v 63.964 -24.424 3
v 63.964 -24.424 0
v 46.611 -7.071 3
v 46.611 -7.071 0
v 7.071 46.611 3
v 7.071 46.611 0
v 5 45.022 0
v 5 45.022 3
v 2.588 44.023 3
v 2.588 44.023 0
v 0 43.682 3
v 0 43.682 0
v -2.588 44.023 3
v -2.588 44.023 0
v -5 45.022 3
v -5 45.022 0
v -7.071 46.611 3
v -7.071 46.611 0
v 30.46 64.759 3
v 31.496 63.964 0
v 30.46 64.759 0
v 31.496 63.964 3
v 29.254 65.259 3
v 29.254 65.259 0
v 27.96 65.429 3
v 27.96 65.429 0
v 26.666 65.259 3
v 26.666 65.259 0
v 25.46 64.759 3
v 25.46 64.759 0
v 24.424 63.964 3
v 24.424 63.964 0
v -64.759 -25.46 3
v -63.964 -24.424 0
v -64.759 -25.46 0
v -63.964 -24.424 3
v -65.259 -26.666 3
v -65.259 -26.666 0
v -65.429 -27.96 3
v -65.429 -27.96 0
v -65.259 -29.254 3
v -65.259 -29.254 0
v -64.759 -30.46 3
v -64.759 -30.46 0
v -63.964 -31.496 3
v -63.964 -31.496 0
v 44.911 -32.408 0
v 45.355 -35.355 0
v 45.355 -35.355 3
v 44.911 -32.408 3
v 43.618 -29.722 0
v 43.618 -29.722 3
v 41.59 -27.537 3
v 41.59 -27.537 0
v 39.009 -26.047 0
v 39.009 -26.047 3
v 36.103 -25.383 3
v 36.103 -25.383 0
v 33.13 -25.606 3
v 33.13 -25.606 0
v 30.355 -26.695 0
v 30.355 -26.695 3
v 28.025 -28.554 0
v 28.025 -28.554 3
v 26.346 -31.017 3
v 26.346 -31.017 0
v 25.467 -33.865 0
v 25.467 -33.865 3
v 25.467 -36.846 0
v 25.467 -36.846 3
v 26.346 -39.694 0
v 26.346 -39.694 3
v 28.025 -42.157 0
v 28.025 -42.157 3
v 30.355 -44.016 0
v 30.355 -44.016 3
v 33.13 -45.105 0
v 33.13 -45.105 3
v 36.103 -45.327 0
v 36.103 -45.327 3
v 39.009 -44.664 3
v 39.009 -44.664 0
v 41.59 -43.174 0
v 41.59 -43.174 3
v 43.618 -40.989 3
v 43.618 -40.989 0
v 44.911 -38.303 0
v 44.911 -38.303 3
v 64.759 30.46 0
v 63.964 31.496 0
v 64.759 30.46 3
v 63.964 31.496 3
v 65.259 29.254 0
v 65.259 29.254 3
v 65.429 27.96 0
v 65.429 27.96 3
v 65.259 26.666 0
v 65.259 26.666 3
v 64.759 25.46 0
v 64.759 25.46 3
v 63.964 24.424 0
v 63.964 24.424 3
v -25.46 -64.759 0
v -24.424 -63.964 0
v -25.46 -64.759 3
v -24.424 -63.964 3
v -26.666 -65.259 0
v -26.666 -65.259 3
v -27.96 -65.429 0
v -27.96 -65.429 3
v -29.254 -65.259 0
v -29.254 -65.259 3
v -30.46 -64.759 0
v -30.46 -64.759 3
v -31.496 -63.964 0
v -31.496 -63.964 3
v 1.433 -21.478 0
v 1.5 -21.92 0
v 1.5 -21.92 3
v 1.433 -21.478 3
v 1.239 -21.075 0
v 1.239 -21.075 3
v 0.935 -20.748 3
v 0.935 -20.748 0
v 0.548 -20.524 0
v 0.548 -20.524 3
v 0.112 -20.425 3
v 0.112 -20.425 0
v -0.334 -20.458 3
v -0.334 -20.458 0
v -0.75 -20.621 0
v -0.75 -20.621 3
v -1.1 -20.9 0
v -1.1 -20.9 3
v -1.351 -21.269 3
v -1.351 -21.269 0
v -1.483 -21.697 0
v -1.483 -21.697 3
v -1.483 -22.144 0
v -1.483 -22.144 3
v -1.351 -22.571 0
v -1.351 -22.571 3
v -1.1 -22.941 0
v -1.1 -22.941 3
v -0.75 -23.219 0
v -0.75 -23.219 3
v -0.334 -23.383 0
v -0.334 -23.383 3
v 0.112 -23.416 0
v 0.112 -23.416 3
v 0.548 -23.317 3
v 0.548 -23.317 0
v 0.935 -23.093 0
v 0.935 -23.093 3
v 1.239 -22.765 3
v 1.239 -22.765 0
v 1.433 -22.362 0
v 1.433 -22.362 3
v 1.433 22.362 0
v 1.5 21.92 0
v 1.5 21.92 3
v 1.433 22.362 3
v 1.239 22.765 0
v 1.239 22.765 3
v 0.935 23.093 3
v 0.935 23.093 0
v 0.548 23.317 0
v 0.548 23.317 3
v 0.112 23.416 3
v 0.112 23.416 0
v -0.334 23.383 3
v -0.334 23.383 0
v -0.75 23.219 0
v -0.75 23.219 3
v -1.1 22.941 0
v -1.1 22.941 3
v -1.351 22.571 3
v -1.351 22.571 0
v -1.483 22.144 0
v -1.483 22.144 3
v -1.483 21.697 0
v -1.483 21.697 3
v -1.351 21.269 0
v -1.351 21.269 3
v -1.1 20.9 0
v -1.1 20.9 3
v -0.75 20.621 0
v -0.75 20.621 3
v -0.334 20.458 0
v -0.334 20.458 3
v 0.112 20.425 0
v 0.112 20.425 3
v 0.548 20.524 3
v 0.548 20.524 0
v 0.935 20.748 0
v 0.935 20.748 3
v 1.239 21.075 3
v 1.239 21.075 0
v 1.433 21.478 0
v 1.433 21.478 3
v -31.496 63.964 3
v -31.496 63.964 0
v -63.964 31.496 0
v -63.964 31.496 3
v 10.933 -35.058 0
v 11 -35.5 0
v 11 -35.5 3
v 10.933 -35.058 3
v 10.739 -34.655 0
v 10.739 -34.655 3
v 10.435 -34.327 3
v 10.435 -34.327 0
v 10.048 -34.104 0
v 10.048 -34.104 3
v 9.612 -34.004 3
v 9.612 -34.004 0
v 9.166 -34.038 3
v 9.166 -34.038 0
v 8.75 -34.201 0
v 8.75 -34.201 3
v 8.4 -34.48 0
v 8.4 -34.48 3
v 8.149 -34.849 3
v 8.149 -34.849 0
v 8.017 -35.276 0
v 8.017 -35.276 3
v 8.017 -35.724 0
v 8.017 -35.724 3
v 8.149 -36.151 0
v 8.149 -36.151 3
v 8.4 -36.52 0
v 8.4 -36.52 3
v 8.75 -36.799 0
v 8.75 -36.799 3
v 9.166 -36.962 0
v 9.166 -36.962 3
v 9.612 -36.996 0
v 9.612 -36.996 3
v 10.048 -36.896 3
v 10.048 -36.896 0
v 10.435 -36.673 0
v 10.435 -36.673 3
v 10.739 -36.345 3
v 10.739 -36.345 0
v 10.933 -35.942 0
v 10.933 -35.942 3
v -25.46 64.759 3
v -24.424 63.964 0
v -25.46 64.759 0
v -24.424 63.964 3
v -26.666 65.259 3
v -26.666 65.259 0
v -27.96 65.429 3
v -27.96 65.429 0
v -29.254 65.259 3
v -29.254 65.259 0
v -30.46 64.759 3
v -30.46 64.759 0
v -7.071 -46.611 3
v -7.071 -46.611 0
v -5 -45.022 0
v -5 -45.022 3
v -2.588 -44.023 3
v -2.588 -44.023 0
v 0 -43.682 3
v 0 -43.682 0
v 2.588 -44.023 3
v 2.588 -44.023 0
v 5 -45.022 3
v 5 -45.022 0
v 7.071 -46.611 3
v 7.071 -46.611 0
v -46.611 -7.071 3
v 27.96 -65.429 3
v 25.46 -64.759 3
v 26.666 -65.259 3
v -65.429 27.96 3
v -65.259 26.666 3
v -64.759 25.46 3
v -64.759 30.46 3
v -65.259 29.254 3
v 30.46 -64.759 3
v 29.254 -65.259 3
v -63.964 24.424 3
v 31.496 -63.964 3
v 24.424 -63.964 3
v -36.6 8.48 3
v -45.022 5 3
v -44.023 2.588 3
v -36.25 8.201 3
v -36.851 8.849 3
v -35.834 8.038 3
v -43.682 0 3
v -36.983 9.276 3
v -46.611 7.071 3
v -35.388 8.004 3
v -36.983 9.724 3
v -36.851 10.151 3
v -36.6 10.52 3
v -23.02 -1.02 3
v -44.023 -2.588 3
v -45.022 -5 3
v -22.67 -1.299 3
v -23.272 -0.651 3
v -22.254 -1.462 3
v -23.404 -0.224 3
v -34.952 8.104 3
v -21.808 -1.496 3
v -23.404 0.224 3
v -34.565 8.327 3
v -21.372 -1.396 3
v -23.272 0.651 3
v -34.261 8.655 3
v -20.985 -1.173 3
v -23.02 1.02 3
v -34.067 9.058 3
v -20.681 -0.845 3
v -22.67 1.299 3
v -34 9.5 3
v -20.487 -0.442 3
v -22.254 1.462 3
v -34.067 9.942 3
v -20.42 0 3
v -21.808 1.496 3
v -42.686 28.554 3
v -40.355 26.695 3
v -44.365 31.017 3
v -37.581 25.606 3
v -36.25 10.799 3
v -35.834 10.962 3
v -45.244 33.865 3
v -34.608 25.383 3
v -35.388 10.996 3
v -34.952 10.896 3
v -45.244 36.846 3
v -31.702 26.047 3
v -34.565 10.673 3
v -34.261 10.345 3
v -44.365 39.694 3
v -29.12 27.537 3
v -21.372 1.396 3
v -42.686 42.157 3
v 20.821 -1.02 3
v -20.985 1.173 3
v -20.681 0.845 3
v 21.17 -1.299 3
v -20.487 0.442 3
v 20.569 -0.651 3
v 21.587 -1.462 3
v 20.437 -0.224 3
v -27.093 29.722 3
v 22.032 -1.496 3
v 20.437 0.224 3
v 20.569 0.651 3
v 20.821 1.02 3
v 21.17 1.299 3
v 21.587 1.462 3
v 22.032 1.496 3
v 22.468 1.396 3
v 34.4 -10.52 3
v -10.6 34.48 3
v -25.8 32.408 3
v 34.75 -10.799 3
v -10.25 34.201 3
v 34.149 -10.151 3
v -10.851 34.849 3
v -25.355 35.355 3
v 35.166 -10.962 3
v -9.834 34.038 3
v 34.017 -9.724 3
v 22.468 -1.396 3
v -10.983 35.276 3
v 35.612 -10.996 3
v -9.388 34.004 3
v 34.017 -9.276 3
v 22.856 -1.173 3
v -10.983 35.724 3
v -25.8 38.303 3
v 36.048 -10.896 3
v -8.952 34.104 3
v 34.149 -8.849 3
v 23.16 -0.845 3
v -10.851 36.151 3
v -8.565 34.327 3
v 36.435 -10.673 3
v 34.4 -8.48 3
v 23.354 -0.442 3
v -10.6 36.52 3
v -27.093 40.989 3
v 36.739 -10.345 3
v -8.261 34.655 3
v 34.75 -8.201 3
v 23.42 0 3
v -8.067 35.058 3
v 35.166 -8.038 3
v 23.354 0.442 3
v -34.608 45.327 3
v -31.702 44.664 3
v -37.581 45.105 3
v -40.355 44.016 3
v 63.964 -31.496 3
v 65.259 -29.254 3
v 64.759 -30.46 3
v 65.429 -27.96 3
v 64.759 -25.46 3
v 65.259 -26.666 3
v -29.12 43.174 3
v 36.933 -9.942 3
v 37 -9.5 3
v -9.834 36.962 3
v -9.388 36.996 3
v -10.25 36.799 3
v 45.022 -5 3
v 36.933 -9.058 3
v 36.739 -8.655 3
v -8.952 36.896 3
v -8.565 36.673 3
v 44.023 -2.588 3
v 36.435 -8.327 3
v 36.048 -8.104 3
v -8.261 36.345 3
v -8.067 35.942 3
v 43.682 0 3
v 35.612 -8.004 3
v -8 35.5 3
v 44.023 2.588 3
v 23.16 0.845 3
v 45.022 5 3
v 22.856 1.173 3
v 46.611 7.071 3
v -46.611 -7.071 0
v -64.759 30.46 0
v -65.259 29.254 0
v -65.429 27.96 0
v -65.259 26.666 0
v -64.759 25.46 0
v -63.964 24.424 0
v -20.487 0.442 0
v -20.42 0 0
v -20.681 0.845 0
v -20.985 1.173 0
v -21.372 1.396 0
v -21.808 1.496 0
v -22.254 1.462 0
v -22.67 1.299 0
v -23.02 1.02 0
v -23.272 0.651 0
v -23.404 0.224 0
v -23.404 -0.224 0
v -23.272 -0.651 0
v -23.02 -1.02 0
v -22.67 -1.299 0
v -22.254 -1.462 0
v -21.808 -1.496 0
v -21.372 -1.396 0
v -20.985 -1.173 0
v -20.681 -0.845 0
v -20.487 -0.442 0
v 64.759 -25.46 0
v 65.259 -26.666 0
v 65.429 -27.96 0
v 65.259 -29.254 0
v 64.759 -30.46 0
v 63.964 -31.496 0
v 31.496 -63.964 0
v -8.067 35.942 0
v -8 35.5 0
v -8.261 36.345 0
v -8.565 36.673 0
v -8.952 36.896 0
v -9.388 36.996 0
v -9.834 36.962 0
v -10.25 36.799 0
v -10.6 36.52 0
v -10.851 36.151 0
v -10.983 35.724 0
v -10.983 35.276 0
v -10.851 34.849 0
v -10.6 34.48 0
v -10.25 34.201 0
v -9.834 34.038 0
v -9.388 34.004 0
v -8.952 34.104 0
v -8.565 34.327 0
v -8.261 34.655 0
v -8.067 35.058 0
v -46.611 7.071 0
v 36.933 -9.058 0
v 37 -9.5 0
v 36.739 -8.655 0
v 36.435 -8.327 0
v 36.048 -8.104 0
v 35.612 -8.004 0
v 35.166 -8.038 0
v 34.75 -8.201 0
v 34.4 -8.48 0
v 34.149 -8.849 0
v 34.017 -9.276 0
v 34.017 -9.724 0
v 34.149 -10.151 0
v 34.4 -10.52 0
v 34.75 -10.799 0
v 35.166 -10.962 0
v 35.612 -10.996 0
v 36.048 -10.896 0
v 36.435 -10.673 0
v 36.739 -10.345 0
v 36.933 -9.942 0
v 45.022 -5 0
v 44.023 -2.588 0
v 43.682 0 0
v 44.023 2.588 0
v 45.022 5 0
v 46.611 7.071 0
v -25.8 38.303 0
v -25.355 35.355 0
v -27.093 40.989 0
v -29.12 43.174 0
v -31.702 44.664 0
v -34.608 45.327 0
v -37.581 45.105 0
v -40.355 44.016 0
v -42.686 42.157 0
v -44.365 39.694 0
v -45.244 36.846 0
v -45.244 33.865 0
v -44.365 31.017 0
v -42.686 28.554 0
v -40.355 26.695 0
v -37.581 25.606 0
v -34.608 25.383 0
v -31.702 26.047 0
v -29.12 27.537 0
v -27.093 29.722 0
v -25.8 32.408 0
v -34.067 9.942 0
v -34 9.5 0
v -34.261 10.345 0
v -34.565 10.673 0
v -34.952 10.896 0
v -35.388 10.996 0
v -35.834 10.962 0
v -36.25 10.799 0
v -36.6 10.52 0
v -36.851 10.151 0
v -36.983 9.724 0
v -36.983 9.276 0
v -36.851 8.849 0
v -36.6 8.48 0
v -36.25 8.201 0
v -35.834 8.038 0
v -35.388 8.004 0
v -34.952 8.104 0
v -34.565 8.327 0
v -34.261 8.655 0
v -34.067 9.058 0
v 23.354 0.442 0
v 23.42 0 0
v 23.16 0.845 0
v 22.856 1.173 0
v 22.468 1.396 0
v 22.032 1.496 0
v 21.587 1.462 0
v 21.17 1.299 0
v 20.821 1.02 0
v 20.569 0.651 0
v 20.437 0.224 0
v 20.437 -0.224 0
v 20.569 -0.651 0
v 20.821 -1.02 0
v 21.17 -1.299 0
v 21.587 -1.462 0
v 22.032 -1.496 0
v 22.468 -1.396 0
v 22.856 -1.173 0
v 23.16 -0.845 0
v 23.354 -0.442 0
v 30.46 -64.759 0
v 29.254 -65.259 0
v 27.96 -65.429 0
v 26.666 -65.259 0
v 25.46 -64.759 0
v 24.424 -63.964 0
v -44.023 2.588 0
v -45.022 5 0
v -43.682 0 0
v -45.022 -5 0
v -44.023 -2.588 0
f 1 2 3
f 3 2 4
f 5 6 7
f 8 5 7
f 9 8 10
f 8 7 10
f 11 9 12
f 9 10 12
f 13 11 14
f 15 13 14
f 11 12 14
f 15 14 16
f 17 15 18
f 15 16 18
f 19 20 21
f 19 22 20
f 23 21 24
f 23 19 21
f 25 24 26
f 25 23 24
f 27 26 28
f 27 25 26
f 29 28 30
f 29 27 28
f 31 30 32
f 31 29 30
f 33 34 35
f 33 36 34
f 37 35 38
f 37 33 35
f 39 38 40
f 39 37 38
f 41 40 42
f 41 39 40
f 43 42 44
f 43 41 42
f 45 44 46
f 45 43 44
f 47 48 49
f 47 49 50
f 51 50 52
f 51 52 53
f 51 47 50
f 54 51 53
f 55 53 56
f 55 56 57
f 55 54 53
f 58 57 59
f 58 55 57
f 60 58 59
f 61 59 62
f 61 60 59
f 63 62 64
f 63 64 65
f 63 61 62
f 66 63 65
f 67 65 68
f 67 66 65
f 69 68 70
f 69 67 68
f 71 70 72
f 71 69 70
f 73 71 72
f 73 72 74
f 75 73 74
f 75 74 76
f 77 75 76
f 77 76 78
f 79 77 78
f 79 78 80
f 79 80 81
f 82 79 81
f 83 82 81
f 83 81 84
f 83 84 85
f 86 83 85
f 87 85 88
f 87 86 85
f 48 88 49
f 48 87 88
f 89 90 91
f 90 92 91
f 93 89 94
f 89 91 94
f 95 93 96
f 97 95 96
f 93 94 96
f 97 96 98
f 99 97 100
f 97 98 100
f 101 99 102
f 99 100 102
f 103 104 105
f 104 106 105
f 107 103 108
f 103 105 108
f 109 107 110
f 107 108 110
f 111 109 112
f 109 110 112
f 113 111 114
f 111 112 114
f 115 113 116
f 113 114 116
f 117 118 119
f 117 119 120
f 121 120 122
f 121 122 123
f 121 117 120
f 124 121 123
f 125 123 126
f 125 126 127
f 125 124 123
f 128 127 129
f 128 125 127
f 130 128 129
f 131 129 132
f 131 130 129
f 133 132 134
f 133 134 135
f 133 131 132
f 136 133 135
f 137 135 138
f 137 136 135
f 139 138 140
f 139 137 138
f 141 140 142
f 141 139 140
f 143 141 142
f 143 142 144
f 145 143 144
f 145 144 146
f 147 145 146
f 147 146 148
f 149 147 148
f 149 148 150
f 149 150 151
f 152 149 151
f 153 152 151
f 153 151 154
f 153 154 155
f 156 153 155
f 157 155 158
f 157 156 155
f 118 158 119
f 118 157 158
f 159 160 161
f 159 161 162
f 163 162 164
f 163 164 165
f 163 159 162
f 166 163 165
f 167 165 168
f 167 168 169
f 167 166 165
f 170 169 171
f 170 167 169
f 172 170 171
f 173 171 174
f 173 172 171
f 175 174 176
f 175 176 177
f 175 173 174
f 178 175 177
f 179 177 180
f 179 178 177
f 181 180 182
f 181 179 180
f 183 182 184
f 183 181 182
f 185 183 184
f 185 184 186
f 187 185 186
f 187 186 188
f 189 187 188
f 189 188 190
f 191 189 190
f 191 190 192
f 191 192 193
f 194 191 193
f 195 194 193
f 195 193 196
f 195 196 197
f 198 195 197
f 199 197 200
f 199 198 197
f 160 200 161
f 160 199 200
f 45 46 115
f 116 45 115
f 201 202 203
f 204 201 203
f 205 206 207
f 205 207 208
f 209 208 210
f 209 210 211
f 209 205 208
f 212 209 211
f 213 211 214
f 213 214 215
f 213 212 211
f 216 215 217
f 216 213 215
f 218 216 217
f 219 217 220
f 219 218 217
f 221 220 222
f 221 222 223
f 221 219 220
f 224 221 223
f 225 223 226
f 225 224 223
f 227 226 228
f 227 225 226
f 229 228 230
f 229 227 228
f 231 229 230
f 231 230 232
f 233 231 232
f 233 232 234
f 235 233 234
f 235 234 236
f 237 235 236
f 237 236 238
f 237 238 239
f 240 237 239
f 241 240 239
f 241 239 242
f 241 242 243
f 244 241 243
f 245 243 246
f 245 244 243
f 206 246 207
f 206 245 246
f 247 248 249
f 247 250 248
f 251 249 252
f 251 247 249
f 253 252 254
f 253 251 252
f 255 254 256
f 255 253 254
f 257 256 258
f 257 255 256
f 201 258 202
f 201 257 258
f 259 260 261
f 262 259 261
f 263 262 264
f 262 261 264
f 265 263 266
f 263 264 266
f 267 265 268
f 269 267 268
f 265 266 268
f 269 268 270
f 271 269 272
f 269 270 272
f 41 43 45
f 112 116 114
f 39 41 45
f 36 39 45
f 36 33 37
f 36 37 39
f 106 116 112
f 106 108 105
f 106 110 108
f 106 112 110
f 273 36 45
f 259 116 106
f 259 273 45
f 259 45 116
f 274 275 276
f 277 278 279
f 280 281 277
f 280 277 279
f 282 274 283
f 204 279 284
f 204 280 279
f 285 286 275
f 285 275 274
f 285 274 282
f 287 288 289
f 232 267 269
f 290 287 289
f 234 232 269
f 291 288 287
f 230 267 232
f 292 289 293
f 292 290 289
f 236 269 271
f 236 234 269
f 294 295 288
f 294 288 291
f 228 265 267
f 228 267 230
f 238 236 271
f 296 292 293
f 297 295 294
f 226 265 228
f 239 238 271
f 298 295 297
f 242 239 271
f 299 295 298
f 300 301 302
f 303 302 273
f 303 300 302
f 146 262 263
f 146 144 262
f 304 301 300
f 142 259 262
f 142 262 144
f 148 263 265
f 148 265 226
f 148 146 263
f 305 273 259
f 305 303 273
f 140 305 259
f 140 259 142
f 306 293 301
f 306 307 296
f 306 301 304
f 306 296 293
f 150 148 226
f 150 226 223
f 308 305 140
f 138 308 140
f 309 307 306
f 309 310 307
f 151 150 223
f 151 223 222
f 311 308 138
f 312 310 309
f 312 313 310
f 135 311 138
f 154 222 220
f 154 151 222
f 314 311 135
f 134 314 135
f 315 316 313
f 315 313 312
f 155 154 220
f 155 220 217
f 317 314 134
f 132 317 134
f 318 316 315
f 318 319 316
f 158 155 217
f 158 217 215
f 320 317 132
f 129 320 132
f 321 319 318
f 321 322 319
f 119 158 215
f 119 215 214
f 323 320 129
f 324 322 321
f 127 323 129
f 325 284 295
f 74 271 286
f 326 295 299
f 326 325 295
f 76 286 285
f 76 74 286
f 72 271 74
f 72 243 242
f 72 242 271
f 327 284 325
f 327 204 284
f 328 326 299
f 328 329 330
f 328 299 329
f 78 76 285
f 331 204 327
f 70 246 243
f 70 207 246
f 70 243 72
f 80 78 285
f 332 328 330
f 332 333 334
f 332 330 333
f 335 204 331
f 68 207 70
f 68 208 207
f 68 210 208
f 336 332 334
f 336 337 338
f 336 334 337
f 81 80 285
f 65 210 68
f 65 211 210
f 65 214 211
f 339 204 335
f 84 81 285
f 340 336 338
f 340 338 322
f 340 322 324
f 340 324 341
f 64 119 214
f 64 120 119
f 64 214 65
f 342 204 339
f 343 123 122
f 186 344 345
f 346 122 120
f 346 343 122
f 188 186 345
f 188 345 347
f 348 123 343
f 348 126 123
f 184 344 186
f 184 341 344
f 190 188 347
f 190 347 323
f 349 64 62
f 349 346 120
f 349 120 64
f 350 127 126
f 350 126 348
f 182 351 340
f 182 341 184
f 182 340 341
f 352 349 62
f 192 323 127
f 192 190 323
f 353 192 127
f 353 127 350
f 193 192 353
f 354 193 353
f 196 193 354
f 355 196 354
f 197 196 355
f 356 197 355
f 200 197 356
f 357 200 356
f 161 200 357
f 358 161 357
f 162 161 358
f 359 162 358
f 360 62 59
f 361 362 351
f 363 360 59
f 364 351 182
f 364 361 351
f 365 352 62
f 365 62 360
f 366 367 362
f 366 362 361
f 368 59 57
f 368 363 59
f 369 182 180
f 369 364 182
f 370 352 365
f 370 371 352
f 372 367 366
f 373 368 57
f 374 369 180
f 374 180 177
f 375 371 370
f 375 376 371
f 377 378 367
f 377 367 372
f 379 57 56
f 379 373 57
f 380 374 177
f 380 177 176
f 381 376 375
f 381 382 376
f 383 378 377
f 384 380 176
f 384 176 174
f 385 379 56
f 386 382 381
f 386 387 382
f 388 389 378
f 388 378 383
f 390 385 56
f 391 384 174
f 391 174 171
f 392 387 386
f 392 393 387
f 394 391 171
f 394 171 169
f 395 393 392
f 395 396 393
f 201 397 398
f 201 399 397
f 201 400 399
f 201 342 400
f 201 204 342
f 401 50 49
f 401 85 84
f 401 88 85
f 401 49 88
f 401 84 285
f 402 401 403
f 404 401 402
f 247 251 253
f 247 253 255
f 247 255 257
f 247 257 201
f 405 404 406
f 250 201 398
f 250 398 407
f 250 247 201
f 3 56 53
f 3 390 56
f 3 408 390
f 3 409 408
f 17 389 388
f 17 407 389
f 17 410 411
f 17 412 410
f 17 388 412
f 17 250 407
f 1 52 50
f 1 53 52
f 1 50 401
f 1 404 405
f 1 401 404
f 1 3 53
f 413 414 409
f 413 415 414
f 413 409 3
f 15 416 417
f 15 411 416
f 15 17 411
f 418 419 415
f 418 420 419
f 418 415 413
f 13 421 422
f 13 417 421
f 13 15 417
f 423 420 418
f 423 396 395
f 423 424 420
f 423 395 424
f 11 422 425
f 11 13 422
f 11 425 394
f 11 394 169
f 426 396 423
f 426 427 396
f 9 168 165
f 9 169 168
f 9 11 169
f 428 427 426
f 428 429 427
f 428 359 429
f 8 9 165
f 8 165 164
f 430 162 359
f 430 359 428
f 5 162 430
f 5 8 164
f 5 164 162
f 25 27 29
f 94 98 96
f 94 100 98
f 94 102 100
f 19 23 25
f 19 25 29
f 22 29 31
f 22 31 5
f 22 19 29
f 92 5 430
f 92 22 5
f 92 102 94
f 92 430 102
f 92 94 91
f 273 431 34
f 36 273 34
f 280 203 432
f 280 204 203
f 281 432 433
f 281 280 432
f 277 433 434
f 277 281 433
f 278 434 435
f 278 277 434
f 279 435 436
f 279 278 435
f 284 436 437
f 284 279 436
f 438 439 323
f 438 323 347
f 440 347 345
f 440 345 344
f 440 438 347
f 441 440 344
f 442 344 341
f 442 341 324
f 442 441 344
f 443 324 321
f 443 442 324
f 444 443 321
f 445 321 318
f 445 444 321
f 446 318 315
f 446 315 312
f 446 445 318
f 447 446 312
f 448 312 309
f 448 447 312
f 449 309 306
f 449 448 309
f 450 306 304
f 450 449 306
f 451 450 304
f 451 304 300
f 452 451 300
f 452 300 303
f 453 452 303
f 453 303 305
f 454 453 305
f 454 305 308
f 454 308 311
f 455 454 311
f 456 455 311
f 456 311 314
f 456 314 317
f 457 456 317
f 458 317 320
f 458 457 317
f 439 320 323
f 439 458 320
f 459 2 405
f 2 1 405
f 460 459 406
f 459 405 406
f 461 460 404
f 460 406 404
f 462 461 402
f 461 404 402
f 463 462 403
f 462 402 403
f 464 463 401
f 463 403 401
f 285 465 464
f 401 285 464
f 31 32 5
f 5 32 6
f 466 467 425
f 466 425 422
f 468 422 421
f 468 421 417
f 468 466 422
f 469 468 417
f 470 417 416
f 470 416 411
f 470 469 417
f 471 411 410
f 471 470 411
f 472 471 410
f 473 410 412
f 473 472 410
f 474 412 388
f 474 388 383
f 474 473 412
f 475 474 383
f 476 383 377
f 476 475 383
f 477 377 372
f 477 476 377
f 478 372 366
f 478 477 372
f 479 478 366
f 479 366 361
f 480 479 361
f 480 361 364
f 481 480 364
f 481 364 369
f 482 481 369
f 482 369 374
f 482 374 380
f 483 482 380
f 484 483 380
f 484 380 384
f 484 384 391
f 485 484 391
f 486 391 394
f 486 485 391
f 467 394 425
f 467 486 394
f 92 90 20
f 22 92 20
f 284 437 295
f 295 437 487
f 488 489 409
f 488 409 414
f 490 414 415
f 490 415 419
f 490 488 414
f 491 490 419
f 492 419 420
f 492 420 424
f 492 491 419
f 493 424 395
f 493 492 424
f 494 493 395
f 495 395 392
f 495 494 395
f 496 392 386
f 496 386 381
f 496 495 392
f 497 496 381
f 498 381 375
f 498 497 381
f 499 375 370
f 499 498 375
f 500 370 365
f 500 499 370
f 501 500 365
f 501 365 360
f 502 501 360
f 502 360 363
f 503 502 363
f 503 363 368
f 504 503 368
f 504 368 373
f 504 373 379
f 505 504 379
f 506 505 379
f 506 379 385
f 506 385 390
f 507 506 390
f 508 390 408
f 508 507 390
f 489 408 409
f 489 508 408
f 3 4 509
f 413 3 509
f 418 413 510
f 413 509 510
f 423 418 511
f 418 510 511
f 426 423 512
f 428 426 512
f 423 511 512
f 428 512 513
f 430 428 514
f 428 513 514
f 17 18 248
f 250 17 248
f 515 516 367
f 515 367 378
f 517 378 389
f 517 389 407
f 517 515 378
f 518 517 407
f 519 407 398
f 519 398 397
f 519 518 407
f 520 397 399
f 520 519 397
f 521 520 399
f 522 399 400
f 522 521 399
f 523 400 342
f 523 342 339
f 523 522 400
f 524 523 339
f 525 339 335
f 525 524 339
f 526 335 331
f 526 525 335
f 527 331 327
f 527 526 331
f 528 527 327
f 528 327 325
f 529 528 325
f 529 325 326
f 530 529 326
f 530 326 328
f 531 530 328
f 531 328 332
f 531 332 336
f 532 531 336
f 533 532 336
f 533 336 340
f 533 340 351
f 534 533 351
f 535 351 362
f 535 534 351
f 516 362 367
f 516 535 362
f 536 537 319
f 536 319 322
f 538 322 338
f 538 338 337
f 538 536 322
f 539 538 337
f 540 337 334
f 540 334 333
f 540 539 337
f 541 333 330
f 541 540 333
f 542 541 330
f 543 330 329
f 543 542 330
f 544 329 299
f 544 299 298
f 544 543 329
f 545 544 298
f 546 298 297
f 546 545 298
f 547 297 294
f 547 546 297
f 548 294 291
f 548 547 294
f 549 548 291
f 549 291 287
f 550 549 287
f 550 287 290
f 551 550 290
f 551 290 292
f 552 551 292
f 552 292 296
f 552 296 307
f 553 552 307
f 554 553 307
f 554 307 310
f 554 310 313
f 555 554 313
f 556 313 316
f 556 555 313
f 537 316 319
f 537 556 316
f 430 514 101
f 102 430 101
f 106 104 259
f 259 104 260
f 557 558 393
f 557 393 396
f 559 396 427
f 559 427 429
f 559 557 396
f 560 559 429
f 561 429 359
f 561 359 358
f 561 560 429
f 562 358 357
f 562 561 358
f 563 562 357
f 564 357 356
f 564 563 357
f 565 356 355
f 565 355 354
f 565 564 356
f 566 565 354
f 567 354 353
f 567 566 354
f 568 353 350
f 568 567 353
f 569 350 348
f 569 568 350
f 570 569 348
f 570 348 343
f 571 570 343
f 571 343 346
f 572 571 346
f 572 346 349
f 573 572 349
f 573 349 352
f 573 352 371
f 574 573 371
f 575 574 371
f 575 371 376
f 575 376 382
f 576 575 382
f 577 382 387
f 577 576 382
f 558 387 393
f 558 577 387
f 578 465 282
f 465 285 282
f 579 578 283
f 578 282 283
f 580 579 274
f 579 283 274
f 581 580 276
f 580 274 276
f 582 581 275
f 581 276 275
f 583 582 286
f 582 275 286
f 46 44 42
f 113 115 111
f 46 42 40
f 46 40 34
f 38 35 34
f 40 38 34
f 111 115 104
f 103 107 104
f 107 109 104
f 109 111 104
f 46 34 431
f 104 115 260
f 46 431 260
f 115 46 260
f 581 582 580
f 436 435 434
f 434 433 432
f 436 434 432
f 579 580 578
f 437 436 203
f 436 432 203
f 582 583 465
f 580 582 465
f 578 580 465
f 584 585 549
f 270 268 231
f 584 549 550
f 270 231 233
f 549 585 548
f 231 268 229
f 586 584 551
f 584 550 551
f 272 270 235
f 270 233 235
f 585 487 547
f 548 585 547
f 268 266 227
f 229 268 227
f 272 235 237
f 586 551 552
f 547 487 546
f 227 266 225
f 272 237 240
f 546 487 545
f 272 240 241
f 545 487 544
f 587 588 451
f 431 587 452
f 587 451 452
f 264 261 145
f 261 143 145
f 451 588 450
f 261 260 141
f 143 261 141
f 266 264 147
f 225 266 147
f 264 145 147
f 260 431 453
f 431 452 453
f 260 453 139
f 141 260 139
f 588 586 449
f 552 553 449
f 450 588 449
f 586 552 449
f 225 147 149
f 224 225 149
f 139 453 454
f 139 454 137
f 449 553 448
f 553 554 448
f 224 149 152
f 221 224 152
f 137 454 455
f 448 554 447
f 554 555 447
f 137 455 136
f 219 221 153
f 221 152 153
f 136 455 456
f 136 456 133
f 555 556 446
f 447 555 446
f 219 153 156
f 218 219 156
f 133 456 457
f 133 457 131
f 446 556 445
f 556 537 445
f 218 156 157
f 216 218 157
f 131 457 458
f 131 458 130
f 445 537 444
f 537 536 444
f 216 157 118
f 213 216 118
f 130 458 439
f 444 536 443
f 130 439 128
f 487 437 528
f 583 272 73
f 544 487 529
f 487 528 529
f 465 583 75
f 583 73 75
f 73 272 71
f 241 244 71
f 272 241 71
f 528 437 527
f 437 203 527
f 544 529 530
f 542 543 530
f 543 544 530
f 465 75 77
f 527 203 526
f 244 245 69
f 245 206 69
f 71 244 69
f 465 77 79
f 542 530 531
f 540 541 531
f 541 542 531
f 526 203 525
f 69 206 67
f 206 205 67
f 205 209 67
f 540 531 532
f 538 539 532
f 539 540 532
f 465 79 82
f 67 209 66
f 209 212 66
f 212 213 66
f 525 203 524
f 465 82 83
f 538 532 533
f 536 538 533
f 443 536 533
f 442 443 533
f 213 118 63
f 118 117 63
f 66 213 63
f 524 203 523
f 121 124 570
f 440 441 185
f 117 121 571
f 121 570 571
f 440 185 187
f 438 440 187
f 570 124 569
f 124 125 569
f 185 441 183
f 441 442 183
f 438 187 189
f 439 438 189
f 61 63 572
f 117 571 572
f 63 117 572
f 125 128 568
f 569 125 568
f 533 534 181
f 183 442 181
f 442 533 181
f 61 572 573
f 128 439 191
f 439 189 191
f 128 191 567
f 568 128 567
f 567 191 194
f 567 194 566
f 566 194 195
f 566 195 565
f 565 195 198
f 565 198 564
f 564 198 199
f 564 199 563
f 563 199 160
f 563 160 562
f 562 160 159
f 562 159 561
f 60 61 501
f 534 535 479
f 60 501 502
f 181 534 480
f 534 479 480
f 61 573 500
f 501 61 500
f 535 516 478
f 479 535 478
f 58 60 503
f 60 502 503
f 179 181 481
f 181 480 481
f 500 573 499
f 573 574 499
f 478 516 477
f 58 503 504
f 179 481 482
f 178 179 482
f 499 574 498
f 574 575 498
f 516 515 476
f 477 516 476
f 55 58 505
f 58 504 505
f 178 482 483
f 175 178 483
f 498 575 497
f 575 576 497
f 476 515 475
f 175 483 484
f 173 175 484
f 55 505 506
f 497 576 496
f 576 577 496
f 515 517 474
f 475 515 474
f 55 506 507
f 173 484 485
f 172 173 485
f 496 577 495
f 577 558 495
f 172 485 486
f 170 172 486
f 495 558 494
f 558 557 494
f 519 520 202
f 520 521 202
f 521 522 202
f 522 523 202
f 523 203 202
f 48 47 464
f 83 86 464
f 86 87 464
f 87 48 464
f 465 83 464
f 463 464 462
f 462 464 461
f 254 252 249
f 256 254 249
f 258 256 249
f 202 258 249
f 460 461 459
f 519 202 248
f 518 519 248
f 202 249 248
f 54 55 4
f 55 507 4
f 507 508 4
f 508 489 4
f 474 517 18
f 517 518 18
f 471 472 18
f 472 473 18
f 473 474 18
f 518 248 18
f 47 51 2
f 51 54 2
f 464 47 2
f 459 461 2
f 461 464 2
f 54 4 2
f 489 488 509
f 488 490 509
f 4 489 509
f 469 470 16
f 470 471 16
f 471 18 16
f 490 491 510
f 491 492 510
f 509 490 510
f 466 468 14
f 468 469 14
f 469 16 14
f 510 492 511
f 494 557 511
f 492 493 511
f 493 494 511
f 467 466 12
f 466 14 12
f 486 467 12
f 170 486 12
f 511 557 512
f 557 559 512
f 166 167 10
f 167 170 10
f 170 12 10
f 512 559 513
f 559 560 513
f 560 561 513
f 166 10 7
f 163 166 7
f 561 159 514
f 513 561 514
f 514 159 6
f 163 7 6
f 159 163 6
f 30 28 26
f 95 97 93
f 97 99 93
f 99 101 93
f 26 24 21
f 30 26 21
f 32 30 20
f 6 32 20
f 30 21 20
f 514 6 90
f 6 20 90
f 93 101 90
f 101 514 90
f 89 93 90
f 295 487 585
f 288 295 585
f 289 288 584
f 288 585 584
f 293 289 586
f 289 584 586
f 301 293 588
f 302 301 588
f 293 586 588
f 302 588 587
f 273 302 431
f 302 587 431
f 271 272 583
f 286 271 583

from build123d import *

# Parameters (mm, degrees)
F0_R     = 1.5
F0_R_2   = 10
F1_DEPTH = 3
F2_R     = 5


with BuildPart() as f1:
    # F0 (on Top) → F1 (new body)
    with BuildSketch(Plane.XY):
        with BuildLine():
            Line((67.5, 27.96), (27.96, 67.5))
            Line((27.96, 67.5), (7.0710678119, 46.6110678119))
            ThreePointArc((7.0710678119, 46.6110678119), (0, 43.6821356237), (-7.0710678119, 46.6110678119))
            Line((-7.0710678119, 46.6110678119), (-27.96, 67.5))
            Line((-27.96, 67.5), (-67.5, 27.96))
            Line((-67.5, 27.96), (-46.6110678119, 7.0710678119))
            ThreePointArc((-46.6110678119, 7.0710678119), (-43.6821356237, 0), (-46.6110678119, -7.0710678119))
            Line((-46.6110678119, -7.0710678119), (-67.5, -27.96))
            Line((-67.5, -27.96), (-27.96, -67.5))
            Line((-27.96, -67.5), (-7.0710678119, -46.6110678119))
            ThreePointArc((-7.0710678119, -46.6110678119), (0, -43.6821356237), (7.0710678119, -46.6110678119))
            Line((7.0710678119, -46.6110678119), (27.96, -67.5))
            Line((27.96, -67.5), (67.5, -27.96))
            Line((67.5, -27.96), (46.6110678119, -7.0710678119))
            ThreePointArc((46.6110678119, -7.0710678119), (43.6821356237, 0), (46.6110678119, 7.0710678119))
            Line((46.6110678119, 7.0710678119), (67.5, 27.96))
        make_face()
        with Locations((9.5, -35.5)):
            Circle(F0_R, mode=Mode.SUBTRACT)
        with Locations((35.3553390593, -35.3553390593)):
            Circle(F0_R_2, mode=Mode.SUBTRACT)
        with Locations((0, -21.9203102168)):
            Circle(F0_R, mode=Mode.SUBTRACT)
        with Locations((35.5, -9.5)):
            Circle(F0_R, mode=Mode.SUBTRACT)
        with Locations((-35.5, 9.5)):
            Circle(F0_R, mode=Mode.SUBTRACT)
        with Locations((-21.9203102168, 0)):
            Circle(F0_R, mode=Mode.SUBTRACT)
        with Locations((-35.3553390593, 35.3553390593)):
            Circle(F0_R_2, mode=Mode.SUBTRACT)
        with Locations((-9.5, 35.5)):
            Circle(F0_R, mode=Mode.SUBTRACT)
        with Locations((21.9203102168, 0)):
            Circle(F0_R, mode=Mode.SUBTRACT)
        with Locations((0, 21.9203102168)):
            Circle(F0_R, mode=Mode.SUBTRACT)
    extrude(amount=F1_DEPTH)

    # F2
    f2_edges = [f1.edges().sort_by_distance(p)[0] for p in [
        (27.96, -67.5, 1.5),
        (67.5, -27.96, 1.5),
        (67.5, 27.96, 1.5),
        (27.96, 67.5, 1.5),
        (-27.96, 67.5, 1.5),
        (-67.5, 27.96, 1.5),
        (-67.5, -27.96, 1.5),
        (-27.96, -67.5, 1.5),
    ]]
    fillet(f2_edges, radius=F2_R)


solid = f1.part
